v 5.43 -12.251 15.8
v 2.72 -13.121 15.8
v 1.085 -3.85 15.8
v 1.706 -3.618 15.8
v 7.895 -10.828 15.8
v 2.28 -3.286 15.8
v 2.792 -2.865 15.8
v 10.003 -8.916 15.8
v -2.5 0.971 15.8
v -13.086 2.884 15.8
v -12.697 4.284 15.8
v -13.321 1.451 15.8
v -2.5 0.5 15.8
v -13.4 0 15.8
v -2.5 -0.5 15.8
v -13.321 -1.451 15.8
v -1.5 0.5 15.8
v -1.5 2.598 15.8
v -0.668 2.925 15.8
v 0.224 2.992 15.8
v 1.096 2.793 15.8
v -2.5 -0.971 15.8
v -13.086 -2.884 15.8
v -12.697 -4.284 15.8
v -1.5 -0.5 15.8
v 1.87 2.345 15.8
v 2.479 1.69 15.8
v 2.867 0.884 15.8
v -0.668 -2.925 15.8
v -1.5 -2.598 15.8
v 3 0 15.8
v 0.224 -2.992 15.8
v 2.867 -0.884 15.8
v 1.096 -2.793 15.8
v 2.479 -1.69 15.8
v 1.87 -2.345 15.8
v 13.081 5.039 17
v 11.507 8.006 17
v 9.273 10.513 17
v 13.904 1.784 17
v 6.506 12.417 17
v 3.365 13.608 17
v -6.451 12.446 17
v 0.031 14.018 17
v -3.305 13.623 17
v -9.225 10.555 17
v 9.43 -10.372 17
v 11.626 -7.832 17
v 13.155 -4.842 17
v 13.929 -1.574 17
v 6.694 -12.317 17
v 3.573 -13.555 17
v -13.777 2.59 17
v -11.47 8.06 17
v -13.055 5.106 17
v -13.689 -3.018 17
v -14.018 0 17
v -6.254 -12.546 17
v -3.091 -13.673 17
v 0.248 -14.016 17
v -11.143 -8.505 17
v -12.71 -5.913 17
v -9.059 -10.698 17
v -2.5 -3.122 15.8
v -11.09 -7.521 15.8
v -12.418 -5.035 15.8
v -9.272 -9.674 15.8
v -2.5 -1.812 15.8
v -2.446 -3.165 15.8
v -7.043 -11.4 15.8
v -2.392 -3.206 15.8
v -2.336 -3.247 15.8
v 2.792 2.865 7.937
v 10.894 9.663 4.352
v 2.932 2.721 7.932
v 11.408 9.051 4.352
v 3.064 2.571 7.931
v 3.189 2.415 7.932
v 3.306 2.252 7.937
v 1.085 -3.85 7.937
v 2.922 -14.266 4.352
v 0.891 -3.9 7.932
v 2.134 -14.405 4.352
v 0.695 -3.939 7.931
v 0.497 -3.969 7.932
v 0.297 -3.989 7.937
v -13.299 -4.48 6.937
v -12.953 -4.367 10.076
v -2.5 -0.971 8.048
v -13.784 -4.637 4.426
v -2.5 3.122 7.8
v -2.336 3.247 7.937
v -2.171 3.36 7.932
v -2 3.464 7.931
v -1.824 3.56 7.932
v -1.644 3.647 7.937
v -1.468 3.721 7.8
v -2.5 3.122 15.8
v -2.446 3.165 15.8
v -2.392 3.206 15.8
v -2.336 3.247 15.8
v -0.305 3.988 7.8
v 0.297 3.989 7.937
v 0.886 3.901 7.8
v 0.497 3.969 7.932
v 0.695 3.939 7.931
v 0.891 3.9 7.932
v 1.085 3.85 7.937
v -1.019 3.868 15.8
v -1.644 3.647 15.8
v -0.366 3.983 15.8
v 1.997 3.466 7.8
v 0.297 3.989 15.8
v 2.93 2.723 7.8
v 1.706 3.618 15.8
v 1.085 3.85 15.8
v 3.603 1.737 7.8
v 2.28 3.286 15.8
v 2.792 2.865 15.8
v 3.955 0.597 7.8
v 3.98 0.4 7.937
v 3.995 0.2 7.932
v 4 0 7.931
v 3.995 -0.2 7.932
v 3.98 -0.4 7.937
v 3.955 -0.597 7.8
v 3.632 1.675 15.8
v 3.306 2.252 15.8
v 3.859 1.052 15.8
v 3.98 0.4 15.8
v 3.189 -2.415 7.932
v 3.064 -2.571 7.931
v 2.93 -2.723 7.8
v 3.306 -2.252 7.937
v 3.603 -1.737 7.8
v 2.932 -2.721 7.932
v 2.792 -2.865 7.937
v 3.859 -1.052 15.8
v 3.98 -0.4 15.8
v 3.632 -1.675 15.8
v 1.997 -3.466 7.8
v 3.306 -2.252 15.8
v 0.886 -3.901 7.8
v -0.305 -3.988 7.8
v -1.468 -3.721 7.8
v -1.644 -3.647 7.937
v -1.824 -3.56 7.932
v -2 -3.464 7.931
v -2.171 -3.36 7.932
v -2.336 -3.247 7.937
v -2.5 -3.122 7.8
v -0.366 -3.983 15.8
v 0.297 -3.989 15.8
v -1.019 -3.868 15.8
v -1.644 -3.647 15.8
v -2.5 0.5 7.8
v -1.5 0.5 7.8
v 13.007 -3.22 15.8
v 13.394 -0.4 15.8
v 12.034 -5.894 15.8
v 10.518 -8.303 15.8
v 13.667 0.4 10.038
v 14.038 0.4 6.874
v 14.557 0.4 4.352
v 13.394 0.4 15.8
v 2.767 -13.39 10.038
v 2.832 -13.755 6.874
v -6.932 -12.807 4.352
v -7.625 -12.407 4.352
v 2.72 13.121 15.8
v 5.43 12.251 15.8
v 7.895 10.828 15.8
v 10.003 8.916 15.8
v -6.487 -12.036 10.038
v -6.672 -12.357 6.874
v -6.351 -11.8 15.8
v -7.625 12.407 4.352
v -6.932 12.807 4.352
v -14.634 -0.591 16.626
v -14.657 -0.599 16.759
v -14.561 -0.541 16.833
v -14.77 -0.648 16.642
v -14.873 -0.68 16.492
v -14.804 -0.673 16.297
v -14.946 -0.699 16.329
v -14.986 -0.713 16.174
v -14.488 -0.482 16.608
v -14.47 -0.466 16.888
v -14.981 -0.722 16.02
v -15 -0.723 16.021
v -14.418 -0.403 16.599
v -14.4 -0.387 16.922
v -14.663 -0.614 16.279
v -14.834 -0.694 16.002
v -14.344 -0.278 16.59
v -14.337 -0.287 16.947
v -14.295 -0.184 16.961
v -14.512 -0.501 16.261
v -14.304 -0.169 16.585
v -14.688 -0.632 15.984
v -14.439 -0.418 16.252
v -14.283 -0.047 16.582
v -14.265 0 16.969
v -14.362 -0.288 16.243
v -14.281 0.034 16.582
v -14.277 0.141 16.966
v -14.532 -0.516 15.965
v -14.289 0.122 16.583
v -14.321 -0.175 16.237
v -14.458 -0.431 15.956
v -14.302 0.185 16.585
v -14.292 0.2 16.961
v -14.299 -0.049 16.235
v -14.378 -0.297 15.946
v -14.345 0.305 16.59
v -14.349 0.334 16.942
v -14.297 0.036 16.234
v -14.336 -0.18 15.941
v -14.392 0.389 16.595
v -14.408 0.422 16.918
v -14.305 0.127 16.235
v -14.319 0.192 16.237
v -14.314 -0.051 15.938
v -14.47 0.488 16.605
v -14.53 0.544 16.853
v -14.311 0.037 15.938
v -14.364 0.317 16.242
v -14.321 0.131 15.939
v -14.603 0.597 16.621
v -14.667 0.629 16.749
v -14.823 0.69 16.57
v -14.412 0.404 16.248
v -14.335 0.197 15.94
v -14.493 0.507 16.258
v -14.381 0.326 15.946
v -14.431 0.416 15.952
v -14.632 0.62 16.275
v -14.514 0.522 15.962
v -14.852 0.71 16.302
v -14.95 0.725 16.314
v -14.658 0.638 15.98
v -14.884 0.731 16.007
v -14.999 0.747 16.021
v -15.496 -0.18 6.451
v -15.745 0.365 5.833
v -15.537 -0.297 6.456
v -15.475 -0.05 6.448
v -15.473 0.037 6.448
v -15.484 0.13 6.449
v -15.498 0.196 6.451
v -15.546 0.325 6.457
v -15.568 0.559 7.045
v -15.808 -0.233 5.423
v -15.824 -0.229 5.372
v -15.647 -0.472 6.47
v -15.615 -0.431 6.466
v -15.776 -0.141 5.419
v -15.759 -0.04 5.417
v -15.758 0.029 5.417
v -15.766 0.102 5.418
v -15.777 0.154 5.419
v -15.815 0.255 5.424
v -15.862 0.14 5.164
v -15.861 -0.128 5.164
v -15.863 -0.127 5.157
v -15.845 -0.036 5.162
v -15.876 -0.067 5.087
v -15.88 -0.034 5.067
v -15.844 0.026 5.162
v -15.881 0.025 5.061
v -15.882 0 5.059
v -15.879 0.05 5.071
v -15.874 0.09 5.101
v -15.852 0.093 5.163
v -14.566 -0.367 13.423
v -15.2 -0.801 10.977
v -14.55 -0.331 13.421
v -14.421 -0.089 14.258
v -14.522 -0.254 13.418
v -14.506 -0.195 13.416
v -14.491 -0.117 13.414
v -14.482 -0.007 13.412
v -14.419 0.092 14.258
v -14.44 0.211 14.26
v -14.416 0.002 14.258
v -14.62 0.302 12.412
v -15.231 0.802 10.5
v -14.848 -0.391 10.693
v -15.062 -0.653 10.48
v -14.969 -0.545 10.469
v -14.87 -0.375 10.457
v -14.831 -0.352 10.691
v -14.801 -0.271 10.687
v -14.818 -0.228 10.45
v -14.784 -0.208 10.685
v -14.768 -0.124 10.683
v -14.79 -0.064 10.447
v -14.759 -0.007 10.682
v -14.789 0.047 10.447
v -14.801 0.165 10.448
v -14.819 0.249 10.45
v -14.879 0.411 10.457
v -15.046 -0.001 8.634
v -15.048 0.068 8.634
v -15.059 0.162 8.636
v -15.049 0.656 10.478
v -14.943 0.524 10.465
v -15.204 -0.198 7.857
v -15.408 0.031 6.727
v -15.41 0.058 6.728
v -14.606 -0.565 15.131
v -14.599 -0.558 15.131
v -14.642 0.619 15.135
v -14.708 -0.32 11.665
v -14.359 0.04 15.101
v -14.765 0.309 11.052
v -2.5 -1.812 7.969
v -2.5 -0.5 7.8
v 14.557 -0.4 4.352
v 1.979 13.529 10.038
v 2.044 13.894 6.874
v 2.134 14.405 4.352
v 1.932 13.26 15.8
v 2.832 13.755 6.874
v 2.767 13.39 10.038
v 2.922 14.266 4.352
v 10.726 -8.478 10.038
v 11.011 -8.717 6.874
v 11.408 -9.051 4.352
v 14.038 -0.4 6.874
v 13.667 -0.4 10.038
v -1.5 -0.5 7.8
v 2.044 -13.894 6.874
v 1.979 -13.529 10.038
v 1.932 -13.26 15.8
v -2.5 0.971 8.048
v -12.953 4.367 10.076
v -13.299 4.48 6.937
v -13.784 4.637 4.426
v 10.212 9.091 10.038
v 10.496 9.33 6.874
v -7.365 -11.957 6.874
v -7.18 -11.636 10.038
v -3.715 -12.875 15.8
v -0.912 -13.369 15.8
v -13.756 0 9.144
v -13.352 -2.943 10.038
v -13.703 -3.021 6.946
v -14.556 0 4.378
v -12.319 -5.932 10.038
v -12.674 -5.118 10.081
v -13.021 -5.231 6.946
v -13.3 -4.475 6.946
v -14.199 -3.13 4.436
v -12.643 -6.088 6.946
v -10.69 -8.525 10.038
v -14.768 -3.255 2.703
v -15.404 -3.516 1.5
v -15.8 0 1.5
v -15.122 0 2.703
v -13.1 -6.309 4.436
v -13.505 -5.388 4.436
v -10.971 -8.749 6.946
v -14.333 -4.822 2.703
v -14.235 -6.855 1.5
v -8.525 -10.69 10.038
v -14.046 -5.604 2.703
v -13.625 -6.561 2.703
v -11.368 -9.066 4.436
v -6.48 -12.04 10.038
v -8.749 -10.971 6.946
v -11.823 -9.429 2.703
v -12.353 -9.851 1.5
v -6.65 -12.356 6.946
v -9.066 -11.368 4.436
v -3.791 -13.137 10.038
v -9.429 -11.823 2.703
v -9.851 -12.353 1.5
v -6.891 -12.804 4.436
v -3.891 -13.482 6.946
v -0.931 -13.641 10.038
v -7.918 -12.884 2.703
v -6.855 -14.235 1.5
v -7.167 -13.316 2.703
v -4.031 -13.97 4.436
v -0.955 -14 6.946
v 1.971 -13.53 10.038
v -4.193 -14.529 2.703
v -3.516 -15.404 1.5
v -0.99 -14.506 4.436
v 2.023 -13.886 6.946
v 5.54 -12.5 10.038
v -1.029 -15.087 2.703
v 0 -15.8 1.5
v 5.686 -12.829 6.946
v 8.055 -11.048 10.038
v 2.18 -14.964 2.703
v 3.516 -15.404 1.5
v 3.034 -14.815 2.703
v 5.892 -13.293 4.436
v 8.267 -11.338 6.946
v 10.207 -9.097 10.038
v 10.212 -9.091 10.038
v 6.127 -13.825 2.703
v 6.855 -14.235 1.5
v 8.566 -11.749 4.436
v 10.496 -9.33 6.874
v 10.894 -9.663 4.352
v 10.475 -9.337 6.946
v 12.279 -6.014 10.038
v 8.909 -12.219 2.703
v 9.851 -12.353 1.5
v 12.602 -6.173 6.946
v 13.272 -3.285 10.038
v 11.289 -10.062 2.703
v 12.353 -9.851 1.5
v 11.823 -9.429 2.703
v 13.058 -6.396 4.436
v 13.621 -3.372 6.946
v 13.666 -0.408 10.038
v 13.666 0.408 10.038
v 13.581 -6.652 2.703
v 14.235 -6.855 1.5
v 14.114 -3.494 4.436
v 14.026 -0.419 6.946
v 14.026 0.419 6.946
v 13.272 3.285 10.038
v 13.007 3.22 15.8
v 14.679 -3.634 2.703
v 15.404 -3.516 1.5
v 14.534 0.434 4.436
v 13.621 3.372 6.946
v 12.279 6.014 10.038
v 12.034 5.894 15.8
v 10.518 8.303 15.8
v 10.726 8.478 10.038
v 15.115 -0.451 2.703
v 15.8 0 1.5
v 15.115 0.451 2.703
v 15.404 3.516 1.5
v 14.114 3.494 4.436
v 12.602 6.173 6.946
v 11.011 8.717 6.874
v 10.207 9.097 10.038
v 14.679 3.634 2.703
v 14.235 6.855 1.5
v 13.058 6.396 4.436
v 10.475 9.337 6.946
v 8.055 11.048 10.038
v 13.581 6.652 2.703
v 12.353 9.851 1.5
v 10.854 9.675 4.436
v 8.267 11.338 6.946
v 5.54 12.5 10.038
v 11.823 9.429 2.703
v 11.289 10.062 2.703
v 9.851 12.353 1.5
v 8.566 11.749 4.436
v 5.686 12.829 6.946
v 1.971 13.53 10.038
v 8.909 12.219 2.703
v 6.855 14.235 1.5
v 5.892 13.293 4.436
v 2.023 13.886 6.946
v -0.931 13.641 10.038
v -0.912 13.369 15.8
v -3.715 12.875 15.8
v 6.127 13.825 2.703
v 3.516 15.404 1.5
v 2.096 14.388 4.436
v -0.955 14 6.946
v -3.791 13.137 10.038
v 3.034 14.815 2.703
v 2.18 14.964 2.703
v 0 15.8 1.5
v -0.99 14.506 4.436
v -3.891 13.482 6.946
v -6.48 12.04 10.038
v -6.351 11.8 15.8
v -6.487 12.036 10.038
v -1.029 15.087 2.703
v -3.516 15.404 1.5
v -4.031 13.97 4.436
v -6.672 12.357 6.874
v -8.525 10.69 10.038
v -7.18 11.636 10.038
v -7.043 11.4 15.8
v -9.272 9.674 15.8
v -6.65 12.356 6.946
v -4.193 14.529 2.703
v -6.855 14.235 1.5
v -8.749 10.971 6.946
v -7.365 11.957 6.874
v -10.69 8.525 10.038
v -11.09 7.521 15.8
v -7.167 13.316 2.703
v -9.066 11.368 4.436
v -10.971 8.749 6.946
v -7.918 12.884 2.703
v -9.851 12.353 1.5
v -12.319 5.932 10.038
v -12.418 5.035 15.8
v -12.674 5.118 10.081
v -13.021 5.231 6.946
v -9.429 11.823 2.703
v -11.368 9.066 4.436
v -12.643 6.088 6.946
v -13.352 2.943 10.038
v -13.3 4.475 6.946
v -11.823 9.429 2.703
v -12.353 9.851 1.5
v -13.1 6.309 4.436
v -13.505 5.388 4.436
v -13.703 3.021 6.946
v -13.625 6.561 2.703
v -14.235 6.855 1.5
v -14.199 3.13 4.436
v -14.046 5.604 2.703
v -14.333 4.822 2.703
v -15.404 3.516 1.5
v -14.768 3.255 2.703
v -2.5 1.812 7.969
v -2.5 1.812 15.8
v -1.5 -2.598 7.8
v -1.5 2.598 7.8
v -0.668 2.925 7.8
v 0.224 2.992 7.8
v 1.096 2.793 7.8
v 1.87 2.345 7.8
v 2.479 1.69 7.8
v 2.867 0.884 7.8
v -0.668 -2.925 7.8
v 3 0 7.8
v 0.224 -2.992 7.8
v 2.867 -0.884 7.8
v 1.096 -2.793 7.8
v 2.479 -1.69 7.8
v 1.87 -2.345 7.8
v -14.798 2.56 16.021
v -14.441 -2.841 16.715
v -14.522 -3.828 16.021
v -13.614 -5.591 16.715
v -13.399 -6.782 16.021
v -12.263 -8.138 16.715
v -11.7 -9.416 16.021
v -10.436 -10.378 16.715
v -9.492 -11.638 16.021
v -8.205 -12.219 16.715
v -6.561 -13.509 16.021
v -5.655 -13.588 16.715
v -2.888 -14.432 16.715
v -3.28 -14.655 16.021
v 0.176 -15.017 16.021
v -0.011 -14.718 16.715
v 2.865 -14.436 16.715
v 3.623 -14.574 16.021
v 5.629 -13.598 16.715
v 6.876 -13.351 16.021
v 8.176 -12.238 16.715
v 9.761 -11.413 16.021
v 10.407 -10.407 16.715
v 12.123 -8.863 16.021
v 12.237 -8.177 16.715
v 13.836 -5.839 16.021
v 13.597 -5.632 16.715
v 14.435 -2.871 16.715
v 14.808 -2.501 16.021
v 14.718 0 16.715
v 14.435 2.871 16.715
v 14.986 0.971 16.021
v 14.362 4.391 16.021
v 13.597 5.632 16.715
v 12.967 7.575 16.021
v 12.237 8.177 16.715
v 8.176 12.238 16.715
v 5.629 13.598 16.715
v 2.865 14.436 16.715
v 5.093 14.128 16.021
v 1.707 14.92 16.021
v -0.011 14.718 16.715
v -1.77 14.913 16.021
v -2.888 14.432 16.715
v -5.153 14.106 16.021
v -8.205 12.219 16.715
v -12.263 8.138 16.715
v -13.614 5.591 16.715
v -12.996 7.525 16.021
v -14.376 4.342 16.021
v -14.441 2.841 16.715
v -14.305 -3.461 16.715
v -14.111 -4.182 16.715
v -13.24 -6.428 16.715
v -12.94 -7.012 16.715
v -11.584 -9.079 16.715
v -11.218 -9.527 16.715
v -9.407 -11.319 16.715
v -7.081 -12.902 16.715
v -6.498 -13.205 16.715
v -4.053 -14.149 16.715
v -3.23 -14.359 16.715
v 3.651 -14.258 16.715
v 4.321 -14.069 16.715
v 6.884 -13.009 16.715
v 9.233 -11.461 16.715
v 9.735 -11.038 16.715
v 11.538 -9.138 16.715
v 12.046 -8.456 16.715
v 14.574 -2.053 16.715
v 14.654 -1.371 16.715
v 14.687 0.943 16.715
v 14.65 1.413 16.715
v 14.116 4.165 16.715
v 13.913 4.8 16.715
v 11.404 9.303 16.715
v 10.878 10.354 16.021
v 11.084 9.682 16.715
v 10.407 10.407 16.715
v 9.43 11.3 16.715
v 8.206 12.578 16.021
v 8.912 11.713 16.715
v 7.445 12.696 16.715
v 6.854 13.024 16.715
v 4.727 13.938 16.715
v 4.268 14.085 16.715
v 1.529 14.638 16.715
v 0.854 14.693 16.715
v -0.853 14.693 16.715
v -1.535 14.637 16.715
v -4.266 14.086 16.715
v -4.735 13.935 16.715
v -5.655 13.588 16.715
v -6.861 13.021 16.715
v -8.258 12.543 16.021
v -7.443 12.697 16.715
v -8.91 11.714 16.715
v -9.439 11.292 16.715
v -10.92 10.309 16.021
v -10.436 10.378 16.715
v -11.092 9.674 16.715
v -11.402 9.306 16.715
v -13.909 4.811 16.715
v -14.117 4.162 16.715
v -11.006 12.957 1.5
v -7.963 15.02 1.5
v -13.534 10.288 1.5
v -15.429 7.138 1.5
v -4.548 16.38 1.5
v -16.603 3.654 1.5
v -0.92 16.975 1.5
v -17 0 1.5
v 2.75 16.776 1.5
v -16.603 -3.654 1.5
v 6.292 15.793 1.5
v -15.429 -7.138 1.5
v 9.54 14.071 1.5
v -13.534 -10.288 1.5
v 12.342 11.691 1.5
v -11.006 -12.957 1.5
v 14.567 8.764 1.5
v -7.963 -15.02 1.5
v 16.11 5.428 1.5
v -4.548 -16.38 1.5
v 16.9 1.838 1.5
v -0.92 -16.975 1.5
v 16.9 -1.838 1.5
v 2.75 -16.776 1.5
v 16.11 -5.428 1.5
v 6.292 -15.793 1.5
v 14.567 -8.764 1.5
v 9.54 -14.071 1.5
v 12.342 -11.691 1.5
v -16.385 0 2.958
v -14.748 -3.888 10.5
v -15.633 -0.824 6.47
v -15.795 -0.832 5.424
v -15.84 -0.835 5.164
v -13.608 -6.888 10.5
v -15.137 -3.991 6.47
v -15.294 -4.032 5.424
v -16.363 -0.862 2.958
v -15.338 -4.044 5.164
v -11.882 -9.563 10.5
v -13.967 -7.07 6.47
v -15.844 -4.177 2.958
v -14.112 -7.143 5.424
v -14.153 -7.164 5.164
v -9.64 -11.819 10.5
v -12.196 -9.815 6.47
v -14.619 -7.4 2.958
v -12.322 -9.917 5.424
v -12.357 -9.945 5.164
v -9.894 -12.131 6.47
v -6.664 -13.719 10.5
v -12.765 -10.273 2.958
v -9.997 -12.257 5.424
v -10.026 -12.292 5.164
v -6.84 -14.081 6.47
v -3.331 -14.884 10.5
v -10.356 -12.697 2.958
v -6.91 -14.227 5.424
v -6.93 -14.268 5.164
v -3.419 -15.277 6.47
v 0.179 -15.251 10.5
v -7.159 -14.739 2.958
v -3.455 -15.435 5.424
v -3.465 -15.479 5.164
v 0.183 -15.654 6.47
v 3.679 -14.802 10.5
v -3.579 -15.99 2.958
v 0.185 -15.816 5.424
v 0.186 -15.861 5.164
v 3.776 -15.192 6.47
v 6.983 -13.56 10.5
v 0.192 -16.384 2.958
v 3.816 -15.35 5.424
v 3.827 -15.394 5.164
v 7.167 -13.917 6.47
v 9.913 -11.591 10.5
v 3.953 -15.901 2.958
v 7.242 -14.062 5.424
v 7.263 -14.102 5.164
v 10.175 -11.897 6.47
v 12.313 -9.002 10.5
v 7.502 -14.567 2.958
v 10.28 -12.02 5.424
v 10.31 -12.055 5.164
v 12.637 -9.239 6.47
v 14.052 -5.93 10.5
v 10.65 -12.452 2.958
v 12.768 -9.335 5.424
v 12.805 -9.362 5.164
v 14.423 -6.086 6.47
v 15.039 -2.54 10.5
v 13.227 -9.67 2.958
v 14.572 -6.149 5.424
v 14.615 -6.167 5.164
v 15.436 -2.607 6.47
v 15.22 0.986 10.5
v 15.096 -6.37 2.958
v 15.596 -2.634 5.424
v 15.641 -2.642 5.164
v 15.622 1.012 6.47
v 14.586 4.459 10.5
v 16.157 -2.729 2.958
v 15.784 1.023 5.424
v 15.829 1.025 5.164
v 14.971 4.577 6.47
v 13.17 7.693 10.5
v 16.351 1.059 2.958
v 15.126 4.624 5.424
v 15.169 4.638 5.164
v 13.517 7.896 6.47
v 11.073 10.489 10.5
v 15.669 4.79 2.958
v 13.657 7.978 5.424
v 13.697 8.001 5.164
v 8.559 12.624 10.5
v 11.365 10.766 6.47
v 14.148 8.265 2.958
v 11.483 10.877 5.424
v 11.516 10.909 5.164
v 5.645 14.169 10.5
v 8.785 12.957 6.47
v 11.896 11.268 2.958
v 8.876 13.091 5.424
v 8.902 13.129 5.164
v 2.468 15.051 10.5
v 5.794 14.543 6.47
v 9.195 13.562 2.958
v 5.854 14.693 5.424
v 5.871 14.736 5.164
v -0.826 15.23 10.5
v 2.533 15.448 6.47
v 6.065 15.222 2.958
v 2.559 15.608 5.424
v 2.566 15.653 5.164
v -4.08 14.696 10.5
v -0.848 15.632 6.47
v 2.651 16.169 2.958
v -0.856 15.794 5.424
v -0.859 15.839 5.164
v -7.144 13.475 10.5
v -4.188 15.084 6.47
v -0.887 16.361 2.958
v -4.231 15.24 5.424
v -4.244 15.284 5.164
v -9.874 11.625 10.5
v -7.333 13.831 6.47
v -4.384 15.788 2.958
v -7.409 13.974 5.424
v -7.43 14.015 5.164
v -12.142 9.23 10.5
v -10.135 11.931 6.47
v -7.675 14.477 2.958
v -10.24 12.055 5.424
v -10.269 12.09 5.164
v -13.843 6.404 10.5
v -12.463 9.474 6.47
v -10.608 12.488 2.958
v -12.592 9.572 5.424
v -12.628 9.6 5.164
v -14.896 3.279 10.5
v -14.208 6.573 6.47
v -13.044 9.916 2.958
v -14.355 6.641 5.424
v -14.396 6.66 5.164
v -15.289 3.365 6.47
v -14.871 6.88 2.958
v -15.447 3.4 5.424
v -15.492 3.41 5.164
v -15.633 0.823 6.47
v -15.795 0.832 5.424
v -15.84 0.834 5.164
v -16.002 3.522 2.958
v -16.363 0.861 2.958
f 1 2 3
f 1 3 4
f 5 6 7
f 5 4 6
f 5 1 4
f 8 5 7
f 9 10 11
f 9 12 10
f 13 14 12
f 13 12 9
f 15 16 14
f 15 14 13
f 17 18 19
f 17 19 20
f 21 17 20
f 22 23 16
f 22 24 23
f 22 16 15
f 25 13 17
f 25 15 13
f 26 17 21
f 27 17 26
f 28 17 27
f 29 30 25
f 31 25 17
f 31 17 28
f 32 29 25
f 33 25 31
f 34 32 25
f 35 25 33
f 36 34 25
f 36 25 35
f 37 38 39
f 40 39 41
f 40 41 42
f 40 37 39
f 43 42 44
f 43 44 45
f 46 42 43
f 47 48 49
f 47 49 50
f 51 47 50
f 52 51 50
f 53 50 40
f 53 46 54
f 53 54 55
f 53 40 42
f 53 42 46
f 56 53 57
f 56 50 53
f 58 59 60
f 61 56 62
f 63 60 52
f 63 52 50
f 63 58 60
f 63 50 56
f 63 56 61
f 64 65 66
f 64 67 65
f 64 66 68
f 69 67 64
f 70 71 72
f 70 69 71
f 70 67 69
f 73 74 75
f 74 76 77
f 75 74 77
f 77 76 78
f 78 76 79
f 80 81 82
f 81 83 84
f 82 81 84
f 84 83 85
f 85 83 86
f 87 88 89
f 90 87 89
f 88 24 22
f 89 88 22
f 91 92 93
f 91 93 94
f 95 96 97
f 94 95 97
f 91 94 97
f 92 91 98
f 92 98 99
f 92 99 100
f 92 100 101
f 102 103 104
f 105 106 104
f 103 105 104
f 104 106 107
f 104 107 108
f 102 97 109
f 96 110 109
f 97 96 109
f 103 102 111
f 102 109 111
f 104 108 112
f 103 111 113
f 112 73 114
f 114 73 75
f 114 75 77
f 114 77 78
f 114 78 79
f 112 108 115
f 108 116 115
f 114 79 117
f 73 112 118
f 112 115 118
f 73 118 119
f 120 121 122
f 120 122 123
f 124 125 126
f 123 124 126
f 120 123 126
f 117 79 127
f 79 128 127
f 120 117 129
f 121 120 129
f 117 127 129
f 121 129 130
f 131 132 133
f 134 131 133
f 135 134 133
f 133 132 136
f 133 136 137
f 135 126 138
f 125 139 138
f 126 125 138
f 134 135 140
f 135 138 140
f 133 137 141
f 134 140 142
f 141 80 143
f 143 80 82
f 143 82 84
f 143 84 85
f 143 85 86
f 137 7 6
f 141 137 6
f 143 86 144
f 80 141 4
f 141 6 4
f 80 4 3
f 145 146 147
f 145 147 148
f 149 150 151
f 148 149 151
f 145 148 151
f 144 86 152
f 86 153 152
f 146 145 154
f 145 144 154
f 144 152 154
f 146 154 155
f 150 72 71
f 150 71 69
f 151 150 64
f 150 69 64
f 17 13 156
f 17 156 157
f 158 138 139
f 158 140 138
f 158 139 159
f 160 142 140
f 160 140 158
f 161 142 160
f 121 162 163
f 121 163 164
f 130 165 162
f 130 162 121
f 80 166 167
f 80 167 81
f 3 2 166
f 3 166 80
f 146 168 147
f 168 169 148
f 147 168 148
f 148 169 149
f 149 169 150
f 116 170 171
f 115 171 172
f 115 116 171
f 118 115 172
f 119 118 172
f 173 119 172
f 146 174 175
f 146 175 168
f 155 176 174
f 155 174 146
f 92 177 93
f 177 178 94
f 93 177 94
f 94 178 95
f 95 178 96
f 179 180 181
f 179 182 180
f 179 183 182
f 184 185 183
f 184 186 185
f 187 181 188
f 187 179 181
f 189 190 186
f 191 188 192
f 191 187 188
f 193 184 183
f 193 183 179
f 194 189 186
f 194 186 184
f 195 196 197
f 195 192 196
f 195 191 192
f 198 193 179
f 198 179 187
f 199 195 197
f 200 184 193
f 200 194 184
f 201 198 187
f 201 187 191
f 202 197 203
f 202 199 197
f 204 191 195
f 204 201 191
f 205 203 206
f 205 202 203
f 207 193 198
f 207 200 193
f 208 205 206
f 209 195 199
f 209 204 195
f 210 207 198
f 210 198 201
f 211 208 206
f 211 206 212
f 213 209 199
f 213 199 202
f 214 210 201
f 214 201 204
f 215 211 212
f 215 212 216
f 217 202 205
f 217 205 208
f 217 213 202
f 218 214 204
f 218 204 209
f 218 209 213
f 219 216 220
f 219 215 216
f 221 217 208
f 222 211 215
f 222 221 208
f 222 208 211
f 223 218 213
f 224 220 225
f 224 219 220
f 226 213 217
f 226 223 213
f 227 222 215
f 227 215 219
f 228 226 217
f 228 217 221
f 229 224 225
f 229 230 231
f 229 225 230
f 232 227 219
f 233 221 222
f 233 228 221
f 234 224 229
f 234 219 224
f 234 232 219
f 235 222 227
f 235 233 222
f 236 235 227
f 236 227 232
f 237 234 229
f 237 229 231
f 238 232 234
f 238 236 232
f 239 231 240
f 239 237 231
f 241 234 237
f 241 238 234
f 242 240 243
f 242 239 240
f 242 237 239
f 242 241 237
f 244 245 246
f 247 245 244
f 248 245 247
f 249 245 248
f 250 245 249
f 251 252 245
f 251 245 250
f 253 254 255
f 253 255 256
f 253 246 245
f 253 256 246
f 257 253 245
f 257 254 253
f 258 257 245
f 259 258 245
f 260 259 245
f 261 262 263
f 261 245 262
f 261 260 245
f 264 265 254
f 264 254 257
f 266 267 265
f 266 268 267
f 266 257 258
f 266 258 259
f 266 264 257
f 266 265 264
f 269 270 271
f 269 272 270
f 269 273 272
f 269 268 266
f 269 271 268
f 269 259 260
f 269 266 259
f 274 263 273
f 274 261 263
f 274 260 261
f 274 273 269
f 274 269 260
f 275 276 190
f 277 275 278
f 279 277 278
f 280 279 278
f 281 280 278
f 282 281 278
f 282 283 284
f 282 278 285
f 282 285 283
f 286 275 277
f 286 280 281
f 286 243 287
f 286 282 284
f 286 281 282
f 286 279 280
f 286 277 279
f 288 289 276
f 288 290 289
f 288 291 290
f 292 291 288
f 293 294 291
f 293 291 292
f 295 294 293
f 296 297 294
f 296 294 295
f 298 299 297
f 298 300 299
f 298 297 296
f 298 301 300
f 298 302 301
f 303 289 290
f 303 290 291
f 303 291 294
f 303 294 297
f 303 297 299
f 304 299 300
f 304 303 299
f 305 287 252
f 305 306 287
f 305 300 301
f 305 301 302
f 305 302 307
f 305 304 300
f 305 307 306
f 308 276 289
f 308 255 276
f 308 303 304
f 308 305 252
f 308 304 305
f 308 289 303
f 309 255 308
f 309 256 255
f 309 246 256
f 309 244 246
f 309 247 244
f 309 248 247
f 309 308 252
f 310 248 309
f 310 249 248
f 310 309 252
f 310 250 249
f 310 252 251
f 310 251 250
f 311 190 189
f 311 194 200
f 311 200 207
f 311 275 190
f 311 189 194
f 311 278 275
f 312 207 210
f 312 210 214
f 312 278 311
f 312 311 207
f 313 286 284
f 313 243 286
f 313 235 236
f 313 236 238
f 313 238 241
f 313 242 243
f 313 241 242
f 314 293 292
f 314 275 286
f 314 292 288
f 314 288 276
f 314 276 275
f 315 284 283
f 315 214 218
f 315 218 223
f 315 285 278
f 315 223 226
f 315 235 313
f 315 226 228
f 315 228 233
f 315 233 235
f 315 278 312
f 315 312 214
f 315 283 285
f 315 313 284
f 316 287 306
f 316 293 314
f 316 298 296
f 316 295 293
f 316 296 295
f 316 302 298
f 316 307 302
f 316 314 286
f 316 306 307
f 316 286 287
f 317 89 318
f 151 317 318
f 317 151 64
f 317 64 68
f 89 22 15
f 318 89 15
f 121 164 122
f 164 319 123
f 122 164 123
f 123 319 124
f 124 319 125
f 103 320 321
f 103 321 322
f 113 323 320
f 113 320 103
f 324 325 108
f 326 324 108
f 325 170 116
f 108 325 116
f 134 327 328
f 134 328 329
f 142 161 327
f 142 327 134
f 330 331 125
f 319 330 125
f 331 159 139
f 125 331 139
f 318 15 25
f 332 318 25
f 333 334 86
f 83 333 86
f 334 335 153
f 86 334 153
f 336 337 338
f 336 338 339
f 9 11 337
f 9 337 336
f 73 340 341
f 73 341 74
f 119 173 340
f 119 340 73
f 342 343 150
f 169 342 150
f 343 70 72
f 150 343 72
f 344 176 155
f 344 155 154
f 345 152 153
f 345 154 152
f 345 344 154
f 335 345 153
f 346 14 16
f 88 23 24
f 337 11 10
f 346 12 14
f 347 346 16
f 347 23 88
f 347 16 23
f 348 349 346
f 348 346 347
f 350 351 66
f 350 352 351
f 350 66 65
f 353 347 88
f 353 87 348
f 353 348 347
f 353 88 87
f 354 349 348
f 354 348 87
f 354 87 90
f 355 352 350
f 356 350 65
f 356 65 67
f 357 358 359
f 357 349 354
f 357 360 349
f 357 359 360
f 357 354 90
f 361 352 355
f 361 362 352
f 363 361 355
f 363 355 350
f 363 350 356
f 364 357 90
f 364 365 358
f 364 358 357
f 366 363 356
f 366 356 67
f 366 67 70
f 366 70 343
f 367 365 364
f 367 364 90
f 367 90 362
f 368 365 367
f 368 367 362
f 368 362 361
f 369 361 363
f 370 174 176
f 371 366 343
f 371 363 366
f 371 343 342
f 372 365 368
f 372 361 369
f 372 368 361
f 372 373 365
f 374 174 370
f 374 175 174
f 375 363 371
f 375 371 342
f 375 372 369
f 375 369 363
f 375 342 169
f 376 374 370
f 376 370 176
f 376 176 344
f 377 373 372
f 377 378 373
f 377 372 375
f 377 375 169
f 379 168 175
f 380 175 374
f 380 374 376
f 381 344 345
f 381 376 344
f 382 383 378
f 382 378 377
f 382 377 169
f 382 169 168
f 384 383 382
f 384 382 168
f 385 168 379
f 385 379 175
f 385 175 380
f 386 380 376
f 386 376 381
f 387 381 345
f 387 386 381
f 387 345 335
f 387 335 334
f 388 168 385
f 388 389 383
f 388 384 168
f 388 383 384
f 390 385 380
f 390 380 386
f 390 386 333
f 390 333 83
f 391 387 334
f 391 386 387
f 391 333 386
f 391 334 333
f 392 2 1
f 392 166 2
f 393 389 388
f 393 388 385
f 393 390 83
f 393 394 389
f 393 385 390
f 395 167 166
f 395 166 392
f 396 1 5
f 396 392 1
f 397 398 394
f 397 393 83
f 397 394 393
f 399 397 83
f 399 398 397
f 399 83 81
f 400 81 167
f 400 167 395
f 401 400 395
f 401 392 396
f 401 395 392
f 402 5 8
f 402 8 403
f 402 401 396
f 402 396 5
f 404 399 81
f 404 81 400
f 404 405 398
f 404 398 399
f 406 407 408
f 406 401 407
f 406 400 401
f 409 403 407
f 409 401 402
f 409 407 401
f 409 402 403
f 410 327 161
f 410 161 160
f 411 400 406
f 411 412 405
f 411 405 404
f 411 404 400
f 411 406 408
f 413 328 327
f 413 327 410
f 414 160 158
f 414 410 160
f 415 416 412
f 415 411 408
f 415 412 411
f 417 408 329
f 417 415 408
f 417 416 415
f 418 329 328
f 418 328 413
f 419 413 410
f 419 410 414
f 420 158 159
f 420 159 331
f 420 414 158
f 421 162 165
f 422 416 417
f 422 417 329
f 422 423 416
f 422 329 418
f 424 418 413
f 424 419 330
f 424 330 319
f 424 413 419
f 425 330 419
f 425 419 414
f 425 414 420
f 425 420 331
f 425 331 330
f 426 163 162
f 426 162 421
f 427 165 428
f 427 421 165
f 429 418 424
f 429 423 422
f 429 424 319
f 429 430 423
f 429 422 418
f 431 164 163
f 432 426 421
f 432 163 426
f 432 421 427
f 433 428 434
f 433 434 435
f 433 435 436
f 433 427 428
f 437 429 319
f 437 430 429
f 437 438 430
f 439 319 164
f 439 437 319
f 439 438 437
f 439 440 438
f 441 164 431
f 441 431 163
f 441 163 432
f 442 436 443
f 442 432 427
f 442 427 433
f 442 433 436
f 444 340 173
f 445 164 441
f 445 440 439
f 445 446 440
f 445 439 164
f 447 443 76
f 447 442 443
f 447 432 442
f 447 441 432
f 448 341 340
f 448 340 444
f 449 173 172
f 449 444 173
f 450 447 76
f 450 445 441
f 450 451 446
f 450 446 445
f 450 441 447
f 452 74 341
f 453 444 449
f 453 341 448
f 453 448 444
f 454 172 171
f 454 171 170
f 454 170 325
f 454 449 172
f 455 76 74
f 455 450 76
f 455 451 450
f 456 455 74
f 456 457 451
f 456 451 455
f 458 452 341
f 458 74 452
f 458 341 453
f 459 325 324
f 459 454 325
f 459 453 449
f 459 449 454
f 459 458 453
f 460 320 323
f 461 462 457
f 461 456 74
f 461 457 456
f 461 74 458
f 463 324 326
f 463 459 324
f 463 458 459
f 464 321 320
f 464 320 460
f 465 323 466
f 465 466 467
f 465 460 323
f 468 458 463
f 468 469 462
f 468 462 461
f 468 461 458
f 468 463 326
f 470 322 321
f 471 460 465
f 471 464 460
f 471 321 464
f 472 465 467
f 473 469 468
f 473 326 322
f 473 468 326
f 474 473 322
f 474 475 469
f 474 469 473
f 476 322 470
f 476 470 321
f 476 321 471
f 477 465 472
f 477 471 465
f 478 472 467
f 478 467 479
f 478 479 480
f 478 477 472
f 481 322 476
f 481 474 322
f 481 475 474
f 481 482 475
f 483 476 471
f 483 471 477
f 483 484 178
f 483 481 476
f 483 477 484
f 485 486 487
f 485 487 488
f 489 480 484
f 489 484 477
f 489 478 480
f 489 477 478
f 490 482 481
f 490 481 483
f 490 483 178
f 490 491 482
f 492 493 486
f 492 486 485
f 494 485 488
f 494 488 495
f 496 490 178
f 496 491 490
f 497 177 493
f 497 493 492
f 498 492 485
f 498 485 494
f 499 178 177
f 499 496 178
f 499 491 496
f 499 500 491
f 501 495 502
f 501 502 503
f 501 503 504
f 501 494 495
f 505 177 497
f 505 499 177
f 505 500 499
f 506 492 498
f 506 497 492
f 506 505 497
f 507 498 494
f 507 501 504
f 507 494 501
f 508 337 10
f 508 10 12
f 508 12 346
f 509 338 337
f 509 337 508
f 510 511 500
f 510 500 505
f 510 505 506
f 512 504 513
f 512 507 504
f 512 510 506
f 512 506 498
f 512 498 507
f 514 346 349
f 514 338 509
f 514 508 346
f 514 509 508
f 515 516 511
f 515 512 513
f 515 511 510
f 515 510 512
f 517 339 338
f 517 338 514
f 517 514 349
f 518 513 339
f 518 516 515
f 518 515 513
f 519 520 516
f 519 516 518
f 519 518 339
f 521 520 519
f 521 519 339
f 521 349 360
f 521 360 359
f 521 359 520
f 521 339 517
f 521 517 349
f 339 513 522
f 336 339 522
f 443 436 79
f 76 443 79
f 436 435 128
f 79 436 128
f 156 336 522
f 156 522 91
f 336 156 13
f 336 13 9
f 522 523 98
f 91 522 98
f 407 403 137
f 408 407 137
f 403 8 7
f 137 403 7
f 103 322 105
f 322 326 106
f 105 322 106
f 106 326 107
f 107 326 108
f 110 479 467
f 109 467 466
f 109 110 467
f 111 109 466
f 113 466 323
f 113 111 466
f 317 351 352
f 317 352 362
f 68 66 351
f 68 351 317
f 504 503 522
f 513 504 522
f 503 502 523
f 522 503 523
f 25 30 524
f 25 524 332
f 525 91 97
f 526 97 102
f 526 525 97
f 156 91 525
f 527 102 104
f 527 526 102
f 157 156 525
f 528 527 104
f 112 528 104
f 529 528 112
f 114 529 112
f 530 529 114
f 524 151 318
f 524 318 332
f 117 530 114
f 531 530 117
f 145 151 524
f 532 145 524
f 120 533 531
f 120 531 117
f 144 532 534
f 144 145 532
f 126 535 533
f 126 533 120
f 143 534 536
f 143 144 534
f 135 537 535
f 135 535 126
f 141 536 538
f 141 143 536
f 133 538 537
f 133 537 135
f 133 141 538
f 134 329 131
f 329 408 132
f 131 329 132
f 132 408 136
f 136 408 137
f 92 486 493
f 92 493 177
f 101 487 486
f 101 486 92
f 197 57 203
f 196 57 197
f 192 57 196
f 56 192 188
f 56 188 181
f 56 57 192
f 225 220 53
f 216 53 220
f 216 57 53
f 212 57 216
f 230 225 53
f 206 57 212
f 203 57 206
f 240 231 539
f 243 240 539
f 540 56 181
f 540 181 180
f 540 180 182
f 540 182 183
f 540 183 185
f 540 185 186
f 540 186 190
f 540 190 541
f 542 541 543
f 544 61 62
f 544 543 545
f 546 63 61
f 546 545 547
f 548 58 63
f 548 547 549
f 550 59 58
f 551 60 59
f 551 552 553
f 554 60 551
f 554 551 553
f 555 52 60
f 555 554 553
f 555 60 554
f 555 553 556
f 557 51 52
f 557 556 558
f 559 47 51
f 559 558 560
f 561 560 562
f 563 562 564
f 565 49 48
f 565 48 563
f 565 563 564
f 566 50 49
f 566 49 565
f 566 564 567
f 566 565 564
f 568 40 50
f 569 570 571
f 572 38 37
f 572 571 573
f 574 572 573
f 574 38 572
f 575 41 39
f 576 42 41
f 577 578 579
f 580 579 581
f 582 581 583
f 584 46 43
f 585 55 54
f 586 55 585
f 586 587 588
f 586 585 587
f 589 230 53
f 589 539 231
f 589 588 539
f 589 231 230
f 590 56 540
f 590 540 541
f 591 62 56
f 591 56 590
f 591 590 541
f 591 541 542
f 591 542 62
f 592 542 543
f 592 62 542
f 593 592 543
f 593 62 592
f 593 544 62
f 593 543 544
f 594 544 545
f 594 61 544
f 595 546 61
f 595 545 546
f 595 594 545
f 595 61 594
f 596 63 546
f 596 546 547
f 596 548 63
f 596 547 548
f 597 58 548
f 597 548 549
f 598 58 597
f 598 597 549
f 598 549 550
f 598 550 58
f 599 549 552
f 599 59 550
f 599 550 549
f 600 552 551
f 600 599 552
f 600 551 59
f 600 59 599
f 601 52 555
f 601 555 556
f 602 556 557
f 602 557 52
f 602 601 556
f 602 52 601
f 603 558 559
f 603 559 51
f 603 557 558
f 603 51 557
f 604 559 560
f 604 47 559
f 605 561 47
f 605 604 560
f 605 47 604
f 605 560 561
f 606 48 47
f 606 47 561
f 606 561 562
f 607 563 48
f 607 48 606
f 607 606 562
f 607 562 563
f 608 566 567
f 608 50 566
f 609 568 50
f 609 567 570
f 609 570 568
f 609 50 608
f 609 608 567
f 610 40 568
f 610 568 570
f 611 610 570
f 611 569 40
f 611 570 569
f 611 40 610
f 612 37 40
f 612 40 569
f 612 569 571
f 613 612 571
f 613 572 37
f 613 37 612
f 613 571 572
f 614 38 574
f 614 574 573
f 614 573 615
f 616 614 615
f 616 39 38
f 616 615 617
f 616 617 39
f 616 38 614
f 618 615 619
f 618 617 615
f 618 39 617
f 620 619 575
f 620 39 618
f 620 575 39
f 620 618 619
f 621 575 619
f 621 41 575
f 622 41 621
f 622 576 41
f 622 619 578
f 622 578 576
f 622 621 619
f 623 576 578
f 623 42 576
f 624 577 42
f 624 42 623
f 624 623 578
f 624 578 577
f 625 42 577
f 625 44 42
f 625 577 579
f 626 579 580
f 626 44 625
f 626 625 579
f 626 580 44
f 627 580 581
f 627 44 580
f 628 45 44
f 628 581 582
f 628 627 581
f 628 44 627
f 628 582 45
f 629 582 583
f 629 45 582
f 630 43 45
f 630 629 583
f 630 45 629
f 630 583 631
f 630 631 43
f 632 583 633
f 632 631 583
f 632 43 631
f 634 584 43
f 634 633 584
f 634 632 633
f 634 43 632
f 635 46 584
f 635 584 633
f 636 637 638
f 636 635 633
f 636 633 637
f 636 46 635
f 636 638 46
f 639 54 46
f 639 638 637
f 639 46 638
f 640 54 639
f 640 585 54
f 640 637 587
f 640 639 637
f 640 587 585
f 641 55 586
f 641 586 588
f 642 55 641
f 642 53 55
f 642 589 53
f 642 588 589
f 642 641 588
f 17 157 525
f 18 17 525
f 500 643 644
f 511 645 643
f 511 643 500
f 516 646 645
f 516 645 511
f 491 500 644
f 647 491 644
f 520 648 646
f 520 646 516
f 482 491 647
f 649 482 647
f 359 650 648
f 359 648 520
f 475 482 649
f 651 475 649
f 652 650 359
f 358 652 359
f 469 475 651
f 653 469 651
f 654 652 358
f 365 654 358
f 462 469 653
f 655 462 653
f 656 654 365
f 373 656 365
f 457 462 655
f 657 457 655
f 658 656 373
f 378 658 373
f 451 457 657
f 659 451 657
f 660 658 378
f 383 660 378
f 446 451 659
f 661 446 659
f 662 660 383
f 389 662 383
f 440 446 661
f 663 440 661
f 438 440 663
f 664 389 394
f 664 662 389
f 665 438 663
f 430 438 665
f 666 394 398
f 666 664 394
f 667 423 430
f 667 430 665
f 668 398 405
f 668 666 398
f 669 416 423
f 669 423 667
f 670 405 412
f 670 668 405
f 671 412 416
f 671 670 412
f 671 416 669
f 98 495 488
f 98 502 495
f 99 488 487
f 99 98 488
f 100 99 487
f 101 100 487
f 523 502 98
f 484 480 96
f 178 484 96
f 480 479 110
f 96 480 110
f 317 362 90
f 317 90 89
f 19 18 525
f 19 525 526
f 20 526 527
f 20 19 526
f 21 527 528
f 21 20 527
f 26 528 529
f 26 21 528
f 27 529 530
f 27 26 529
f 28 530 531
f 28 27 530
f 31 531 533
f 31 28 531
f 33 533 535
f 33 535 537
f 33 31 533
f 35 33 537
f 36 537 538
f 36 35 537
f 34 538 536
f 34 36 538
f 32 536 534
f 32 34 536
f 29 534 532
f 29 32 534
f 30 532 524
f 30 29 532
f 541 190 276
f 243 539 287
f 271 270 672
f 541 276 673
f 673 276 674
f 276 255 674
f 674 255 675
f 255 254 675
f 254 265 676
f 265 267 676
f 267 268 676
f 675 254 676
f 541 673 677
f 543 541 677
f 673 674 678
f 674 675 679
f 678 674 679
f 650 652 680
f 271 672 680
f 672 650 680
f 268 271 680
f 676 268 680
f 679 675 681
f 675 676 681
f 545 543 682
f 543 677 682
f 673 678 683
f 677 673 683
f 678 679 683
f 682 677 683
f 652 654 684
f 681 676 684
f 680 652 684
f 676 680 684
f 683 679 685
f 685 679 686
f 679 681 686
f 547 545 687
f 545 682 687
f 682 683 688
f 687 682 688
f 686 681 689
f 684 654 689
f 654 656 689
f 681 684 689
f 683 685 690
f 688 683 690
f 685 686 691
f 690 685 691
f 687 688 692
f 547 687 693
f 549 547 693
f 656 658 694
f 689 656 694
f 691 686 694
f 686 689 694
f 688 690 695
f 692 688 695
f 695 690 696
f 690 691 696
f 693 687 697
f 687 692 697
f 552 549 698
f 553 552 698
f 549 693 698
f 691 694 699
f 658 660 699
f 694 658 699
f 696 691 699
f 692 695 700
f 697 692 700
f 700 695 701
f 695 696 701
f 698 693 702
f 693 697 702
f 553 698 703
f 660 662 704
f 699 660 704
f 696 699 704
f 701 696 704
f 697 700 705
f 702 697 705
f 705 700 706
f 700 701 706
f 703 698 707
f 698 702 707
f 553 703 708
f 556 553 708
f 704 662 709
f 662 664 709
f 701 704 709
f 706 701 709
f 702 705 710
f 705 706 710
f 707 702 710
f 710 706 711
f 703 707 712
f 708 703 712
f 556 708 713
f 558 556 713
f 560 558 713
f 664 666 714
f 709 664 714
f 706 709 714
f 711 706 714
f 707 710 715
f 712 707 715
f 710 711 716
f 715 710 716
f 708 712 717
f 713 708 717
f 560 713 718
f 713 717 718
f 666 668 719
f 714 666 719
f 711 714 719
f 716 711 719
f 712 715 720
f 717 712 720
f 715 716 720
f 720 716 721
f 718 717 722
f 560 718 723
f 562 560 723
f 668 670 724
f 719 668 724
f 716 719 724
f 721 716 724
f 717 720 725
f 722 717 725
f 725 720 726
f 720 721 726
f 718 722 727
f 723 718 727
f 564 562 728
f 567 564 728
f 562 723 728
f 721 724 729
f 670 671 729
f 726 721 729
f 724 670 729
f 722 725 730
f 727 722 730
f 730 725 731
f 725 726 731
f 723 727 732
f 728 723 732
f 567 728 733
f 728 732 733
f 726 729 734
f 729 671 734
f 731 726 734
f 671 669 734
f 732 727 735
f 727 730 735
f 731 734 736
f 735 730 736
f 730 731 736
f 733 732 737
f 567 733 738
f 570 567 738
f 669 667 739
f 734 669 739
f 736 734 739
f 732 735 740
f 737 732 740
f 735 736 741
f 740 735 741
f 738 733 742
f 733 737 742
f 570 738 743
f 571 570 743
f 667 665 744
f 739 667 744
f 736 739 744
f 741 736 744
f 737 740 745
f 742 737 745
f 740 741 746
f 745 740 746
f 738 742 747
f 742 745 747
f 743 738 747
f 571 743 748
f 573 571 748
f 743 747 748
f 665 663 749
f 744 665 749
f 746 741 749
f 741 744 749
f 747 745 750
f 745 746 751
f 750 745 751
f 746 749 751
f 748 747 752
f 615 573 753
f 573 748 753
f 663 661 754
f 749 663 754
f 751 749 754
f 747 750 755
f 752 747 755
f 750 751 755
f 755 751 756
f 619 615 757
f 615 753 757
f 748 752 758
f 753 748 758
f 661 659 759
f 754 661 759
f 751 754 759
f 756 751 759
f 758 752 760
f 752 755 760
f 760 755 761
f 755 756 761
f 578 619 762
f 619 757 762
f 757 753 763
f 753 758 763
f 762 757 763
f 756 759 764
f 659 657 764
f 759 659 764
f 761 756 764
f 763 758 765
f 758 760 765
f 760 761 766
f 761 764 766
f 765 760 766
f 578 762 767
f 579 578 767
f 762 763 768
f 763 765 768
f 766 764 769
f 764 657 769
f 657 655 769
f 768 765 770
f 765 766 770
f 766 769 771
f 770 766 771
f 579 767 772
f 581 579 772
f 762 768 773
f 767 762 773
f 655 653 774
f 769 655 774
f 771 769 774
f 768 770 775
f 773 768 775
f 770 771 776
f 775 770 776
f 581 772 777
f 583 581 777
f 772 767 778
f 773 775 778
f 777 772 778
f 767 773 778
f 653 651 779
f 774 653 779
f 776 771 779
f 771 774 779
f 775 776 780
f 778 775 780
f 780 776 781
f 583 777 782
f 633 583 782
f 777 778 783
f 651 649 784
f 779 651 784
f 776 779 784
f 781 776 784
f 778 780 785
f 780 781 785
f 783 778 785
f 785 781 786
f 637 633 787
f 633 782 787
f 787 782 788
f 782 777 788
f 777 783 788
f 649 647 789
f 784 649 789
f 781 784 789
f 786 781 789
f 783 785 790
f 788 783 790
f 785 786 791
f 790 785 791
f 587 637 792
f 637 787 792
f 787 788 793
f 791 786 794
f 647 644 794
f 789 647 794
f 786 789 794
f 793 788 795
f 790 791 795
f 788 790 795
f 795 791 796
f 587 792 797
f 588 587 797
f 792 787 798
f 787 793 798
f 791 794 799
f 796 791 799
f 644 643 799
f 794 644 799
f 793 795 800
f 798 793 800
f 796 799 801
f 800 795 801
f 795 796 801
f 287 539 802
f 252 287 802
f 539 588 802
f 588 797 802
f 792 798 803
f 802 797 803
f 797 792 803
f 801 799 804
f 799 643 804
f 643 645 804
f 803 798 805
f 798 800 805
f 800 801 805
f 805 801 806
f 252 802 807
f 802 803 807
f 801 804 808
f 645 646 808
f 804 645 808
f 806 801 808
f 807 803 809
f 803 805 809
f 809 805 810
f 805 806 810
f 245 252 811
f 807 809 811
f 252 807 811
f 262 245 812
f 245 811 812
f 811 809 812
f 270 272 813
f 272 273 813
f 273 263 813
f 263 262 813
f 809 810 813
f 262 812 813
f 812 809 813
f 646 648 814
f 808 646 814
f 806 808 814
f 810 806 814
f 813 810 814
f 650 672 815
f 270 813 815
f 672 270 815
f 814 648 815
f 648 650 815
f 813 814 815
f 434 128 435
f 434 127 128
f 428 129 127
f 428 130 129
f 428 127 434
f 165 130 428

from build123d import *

# Parameters (mm, degrees)
PAD_DEPTH             = 8
SKETCH003_W           = 5.5
SKETCH003_H           = 1
POCKET_DEPTH          = 8
FILLET001_R           = 1
PAD001_DEPTH          = 0.4
POLARPATTERN_COUNT    = 4
POLARPATTERN_ANGLE    = 120
POLARPATTERN001_COUNT = 4
POLARPATTERN001_ANGLE = 120
PAD002_DEPTH          = 0.8


with BuildPart() as part:
    # Sketch → Revolution001 (revolve)
    with BuildSketch(Plane.XZ):
        with BuildLine():
            Line((-15, 17), (0, 17))
            Line((0, 17), (0, 15.8))
            Line((0, 15.8), (-13.4, 15.8))
            add(Edge.make_bspline(
                [(-13.4, 15.8), (-13.6, 4.4), (-15.8, 1.5)],
                knots=[0, 0, 0, 1, 1, 1], degree=2))
            Line((-15.8, 1.5), (-17, 1.5))
            add(Edge.make_bspline(
                [(-15, 17), (-15.191235, 4.567246), (-17, 1.5)],
                knots=[0, 0, 0, 1, 1, 1], degree=2))
        make_face()
    revolve(axis=Axis((0, 0, 0), (0, 0, 1)))

    # Sketch002 (on Face2 of Revolution001) → Pad (new body)
    with BuildSketch(Plane(origin=(0, 0, 15.8), x_dir=(1, 0, 0), z_dir=(0, 0, -1))):
        with BuildLine():
            Line((-2.5, 3.122499), (-2.5, -3.122499))
            ThreePointArc((-2.5, -3.122499), (4, 0), (-2.5, 3.122499))
        make_face()
        with BuildLine():
            Line((-1.5, 2.598076), (-1.5, -2.598076))
            ThreePointArc((-1.5, -2.598076), (3, 0), (-1.5, 2.598076))
        make_face(mode=Mode.SUBTRACT)
    extrude(amount=PAD_DEPTH)

    # Sketch003 (on Face8 of Pad) → Pocket (cut)
    with BuildSketch(Plane(origin=(0, 0, 7.8), x_dir=(1, 0, 0), z_dir=(0, 0, -1))):
        Rectangle(SKETCH003_W, SKETCH003_H)
    extrude(amount=-POCKET_DEPTH, mode=Mode.SUBTRACT)

    # Fillet001
    fillet001_edges = [part.edges().sort_by_distance(p)[0] for p in [
        (15, 0, 17),
    ]]
    fillet(fillet001_edges, radius=FILLET001_R)

    # Sketch004 → Pad001 (join, symmetric)
    with BuildSketch(Plane.XZ):
        Polygon((3.5, 16.2), (14.1, 16.2), (15.3, 4.1), (3.5, 8.1), align=None)
    pad001 = extrude(amount=PAD001_DEPTH, both=True)

    # PolarPattern: Pad001 ×4 about axis
    polarpattern_axis = Axis((0, 0, 0), (0, 0, 1))
    for i in range(1, POLARPATTERN_COUNT):
        add(pad001.rotate(polarpattern_axis, i * POLARPATTERN_ANGLE / (POLARPATTERN_COUNT - 1)))

    # PolarPattern001: Pad001 ×4 about axis
    polarpattern001_axis = Axis((0, 0, 0), (0, 0, -1))
    for i in range(1, POLARPATTERN001_COUNT):
        add(pad001.rotate(polarpattern001_axis, i * POLARPATTERN001_ANGLE / (POLARPATTERN001_COUNT - 1)))

    # Sketch005 (on DatumPlane) → Pad002 (join)
    with BuildSketch(Plane(origin=(0, -1, 0), x_dir=(0.951057, 0.309017, 0), z_dir=(0.309017, -0.951057, 0))):
        Polygon((-2.2, 16.2), (-14.1, 16.2), (-15.3, 4.1), (-2.2, 8.1), align=None)
    pad002 = extrude(amount=-PAD002_DEPTH)

    # Mirrored: Pad002 across XZ
    add(pad002.mirror(Plane.XZ))

    # Sketch006 (on DatumPlane) → Groove (revolve, cut)
    with BuildSketch(Plane.XZ):
        with BuildLine():
            Line((-14.256, 21.131777), (-16.27368, 4.256502))
            add(Edge.make_bspline(
                [(-14.256, 21.131777), (-14.019386, 16.117344), (-14.892639, 6.241907), (-16.27368, 4.256502)],
                knots=[0, 0, 0, 0, 1, 1, 1, 1], degree=3))
        make_face()
    revolve(axis=Axis((-17, 0, 0), (0.121265, 0.000738, 0.99262)), mode=Mode.SUBTRACT)


solid = part.part
